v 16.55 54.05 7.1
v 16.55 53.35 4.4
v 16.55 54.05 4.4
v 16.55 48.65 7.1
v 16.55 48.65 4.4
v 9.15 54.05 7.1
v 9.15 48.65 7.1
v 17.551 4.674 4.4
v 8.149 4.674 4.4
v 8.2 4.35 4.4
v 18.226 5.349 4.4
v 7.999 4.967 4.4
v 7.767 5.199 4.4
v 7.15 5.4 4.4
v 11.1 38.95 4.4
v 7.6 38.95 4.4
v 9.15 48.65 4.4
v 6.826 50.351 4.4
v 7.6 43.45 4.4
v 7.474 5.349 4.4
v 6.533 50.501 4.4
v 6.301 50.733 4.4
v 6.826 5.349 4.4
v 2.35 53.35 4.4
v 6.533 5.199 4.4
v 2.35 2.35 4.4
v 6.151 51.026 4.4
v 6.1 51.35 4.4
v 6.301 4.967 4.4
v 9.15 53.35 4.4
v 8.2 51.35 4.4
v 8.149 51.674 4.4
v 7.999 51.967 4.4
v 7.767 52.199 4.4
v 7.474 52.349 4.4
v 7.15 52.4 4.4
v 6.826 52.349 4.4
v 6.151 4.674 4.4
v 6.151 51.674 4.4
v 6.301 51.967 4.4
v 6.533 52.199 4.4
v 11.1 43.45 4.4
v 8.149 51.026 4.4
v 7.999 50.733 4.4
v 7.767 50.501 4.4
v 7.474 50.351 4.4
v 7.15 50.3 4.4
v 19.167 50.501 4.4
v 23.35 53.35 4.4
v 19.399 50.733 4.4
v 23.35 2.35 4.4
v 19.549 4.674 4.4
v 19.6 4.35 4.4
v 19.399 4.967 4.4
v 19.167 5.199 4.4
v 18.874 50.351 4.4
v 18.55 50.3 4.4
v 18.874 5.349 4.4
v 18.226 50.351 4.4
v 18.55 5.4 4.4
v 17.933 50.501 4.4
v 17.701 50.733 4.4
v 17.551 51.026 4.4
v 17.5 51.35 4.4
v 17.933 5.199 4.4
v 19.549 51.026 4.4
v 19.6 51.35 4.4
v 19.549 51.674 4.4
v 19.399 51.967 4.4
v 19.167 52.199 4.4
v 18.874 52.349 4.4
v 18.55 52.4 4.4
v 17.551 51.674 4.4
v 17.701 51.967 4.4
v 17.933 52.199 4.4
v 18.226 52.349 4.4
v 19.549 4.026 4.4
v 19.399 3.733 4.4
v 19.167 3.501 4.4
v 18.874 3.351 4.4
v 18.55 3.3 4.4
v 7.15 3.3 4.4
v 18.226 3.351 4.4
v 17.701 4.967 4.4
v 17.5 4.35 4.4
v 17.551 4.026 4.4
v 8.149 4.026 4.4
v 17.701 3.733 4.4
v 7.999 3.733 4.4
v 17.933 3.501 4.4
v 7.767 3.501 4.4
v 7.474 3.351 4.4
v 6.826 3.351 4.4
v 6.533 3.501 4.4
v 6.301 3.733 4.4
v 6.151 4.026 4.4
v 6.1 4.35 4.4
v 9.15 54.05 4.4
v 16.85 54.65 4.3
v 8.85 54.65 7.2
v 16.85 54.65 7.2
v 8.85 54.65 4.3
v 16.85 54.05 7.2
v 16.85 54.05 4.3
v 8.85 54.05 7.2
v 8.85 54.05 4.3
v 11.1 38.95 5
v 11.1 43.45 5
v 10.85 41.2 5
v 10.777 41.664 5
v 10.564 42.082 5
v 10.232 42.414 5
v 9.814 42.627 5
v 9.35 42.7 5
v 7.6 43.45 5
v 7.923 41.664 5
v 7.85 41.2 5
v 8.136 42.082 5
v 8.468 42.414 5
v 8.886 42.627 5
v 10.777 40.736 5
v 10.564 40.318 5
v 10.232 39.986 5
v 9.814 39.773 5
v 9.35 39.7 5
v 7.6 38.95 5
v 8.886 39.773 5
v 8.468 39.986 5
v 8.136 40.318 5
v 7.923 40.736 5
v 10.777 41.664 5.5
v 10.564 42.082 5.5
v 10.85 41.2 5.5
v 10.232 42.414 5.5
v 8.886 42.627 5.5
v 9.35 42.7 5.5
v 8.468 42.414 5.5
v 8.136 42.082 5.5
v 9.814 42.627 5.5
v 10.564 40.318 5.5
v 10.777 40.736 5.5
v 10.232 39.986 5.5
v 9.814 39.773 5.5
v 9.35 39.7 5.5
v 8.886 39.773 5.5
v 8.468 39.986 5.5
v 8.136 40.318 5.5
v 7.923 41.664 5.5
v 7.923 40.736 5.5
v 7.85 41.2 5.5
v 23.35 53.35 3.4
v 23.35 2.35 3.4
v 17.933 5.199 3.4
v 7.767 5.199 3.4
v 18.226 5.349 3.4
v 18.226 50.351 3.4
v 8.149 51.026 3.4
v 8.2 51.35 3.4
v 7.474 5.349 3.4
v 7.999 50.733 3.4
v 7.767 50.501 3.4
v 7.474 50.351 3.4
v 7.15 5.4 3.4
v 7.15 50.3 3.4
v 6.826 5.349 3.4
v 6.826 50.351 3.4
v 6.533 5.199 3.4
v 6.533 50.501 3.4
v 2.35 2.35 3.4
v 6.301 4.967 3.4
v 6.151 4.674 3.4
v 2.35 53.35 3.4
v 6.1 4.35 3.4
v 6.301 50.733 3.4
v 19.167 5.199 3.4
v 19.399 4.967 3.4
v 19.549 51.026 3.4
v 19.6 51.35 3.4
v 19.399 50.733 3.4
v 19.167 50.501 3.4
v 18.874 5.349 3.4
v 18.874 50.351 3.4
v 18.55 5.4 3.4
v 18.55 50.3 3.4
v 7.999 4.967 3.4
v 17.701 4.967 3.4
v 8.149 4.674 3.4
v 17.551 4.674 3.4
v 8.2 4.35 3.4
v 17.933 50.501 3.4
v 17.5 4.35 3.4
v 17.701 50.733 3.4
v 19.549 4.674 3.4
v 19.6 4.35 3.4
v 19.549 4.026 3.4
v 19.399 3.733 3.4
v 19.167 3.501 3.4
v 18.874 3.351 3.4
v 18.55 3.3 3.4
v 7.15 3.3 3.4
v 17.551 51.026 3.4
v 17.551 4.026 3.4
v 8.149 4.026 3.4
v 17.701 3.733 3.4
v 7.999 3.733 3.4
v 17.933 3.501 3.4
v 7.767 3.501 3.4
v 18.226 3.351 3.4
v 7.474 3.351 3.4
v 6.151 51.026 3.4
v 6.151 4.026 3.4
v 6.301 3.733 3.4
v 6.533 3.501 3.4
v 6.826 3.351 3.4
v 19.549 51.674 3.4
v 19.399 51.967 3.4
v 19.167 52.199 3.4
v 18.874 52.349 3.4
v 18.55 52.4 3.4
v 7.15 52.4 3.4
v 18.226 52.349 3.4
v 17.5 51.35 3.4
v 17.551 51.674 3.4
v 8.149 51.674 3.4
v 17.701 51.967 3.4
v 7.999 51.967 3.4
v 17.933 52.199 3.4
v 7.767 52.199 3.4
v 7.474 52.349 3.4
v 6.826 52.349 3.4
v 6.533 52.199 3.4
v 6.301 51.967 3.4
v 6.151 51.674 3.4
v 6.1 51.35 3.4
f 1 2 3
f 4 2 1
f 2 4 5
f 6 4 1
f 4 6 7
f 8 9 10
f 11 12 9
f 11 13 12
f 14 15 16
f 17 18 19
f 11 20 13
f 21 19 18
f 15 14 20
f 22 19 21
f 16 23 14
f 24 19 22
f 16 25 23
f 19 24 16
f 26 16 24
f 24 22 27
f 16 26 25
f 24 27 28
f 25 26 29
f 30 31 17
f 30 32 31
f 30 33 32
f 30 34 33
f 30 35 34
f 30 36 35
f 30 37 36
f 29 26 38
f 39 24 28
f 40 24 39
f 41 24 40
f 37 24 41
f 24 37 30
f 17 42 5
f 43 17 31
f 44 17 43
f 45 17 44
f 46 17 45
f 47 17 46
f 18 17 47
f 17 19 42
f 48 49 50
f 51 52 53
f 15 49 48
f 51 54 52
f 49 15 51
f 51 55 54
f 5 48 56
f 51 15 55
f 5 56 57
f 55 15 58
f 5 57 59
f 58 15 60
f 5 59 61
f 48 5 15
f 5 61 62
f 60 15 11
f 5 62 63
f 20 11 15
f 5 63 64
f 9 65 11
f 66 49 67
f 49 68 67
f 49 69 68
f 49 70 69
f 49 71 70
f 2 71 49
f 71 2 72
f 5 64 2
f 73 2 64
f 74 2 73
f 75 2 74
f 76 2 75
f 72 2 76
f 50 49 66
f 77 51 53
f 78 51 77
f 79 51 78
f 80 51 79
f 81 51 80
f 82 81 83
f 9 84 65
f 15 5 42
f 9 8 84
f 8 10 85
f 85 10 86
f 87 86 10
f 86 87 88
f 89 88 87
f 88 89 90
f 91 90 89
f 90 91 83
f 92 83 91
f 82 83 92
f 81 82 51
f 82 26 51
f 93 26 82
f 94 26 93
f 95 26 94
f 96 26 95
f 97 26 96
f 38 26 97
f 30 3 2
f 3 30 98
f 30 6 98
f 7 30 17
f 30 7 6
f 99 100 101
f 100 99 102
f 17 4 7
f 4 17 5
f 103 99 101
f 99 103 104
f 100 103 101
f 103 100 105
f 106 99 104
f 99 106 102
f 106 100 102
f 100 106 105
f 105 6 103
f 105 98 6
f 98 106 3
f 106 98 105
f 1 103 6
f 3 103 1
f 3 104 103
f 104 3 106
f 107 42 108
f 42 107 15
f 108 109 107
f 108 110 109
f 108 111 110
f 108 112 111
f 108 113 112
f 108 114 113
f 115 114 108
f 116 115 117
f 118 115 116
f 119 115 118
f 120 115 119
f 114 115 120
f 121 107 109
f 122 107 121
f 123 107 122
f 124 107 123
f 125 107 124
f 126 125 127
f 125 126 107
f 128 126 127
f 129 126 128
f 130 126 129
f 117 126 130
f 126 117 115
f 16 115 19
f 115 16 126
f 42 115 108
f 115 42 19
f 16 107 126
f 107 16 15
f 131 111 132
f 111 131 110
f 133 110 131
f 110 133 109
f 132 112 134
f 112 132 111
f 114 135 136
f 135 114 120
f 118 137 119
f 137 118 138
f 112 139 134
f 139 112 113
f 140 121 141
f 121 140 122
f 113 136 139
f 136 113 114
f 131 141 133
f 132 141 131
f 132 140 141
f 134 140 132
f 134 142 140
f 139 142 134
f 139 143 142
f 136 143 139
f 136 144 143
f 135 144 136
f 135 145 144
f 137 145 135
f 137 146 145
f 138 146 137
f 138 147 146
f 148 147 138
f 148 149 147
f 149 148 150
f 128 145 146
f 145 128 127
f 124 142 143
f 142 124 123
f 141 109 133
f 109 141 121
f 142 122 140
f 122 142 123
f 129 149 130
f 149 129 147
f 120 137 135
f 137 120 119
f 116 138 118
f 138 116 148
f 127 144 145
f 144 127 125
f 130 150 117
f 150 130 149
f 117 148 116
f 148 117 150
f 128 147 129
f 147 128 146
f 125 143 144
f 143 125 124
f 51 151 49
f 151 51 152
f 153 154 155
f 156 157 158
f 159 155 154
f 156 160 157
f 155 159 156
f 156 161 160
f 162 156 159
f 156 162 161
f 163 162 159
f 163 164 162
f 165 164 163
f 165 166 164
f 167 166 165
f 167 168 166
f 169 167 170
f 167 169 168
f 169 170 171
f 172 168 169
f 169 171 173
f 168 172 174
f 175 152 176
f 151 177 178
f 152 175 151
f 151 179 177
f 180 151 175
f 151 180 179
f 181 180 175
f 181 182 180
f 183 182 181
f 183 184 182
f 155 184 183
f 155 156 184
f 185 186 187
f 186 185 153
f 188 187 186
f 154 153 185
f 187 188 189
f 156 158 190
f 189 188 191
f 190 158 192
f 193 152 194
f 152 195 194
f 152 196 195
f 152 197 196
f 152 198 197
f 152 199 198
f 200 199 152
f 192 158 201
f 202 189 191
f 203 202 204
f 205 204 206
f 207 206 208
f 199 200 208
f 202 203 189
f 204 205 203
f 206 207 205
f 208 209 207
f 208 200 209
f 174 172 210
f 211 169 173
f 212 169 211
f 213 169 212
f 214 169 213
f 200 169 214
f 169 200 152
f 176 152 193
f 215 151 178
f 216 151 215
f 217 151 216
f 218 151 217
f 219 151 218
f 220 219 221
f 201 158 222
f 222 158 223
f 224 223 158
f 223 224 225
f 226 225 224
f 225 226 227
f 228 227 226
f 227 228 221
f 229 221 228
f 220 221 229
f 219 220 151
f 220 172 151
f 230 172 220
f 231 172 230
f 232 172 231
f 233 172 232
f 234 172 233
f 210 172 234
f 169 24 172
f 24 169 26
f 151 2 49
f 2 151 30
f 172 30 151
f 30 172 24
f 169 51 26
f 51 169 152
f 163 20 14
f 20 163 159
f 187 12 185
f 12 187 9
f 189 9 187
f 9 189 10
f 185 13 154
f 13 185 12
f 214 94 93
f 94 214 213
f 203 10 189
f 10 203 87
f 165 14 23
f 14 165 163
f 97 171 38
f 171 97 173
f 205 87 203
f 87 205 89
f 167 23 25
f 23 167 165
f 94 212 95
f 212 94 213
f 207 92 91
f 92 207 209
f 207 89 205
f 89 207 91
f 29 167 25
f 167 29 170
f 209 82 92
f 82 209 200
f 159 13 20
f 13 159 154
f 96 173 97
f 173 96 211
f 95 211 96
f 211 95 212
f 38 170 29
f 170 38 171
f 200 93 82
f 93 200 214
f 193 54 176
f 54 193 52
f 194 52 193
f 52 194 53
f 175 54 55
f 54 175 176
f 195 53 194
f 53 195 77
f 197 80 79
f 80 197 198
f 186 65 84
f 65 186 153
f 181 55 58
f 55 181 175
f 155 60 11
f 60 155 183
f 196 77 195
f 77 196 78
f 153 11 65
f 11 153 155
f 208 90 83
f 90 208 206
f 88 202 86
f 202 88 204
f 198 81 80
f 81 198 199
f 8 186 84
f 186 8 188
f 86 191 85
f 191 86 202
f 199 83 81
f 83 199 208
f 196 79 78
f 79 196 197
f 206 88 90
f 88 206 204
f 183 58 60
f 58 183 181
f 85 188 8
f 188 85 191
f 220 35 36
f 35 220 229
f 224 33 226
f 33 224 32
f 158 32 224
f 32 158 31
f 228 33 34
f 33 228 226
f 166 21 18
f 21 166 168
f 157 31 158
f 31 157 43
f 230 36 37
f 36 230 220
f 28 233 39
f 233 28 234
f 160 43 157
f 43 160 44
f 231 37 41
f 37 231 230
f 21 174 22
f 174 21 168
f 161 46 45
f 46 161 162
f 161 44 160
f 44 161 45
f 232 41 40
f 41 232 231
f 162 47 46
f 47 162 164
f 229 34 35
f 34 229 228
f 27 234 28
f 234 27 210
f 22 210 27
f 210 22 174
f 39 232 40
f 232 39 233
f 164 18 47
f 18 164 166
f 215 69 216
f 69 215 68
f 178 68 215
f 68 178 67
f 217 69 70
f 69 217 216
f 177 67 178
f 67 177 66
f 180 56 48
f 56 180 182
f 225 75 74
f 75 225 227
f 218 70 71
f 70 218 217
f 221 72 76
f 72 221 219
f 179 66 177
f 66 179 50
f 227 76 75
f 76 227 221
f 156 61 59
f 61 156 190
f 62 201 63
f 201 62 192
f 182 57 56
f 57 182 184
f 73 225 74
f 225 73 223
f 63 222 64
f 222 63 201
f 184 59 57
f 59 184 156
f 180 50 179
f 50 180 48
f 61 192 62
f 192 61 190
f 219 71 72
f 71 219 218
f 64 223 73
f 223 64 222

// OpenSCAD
resolution = 20; //[10, 20, 30, 50, 100]
$fn = resolution;

show_frame = false; // [true, false]
show_pico = true; // [true, false]
show_lid = false; // [true, false]
show_button = false; // [true, false]

module rounded_plate(w, h, t, d) {
    translate([0, (d/2), 0])
    cube([w, (h-d), t]);
    translate([(d/2), 0, 0])
    cube([(w-d), h, t]);
    translate([(d/2), (d/2), 0])
    cylinder(h=t, d=d);
    translate([w-(d/2), (d/2), 0])
    cylinder(h=t, d=d);
    translate([(d/2), h-(d/2), 0])
    cylinder(h=t, d=d);
    translate([w-(d/2), h-(d/2), 0])
    cylinder(h=t, d=d);
}

module usb_port() {
    translate([0.3, 0, 0])
    color("grey")
    difference() {
        union() {
            cube([7.4, 6, 2.7]);
            translate([-0.3, 5.4, -0.1])
            cube([8, 0.6, 2.9]);
        }
    }
}

module switch() {
    color("grey")
    cube([3.5, 4.5, 1]);
    color("white")
    translate([(3.5/2), (4.5/2), 0])
    cylinder(h=1.5, d=3);
}

p_w = 21;
p_h = 51;
p_t = 1.0;
os = 0.35;
b = 2;

module pico() {
    translate([((p_w-8)/2), ((p_h+1.3)-6), p_t])
    usb_port();

    translate([5.25, 36.6, 0.6])
    switch();

    difference() {
        color("green")
        cube([p_w, p_h, 1]);

        translate([((p_w/2)-5.7), 2, -0.01])
        cylinder(h=p_t+0.02, d=2.1);
       
        translate([(p_w-((p_w/2)-5.7)), 2, -0.01])
        cylinder(h=p_t+0.02, d=2.1);

        translate([((p_w/2)-5.7), (p_h-2), -0.01])
        cylinder(h=p_t+0.02, d=2.1);

        translate([(p_w-((p_w/2)-5.7)), (p_h-2), -0.01])
        cylinder(h=p_t+0.02, d=2.1);
    }
}

if (show_pico) {
    translate([(os+b), (os+b), 3.4])
    pico();
}

if (show_frame) {
    union() {
        difference() {
            // Outer frame
            rounded_plate(p_w+(2*(os+b)), p_h+(2*(os+b)), 10, (2*(os+b)));
            
            // Board cut-out
            translate([b, b, -1])
            cube([p_w+(2*os), p_h+(2*os), 12]);
            
            // USB port cut-out
//            translate([b+os+((p_w-10)/2), b+os+((p_h+1)-6), 3.4])
//            cube([10, 8, 4.7]);
            translate([b+os+((p_w-10)/2), b+(2*os)+p_h-1, 8.1])
            rotate([-90, 0, 0])
            rounded_plate(10, 4.7, 4.7, 2);
            
            // Lid release cut-out
            difference() {
                union() {
                    translate([b+os+((p_w-10)/2), -1, 10-1])
                    cube([10, 8, 2]);
                    translate([b+os+((p_w-6)/2), -1, 10-1])
                    rotate([-90, 0, 0])
                    cylinder(h=4, d=2); 
                    translate([b+os+((p_w-6)/2), -1, 10-2])
                    cube([6, 8, 3]);
                    translate([b+os+((p_w+6)/2), -1, 10-1])
                    rotate([-90, 0, 0])
                    cylinder(h=4, d=2); 
                }
                translate([b+os+((p_w+10)/2), -1, 10-1])
                rotate([-90, 0, 0])
                cylinder(h=4, d=2); 
                translate([b+os+((p_w-10)/2), -1, 10-1])
                rotate([-90, 0, 0])
                cylinder(h=4, d=2); 
            }
            
            // Outer frame
            translate([1, 1, 10-1.2])
            rounded_plate(p_w+(2*(os+b))-2, p_h+(2*(os+b))-2, 2, (2*(os+b))-2);

            // Left top retainer cut-out
            translate([b+os+(p_w/2)-(3.2/2)-7.1, b+p_h+(2*os), 10-3+0.2])
            cube([3.2, 0.7, 1.0]);

            // Right top retainer cut-out
            translate([b+os+(p_w/2)-(3.2/2)+7.1, b+p_h+(2*os), 10-3+0.2])
            cube([3.2, 0.7, 1.0]);

            // Left bottom retainer cut-out
            translate([b+os+(p_w/2)-(4/2)-7.1, b+os-0.7, 10-3+0.2])
            cube([4, 0.7, 1.0]);

            // Right bottom retainer cut-out
            translate([b+os+(p_w/2)-(4/2)+7.1, b+os-0.7, 10-3+0.2])
            cube([4, 0.7, 1.0]);

            // Left retainer cut-out
            translate([b-0.7, b+os+(p_h/2)-2, 10-3+0.2])
            cube([0.7, 4, 1.0]);

            // Right retainer cut-out
            translate([b+(2*os)+p_w, b+os+(p_h/2)-2, 10-3+0.2])
            cube([0.7, 4, 1.0]);
        }
        
        // Left support rail
        translate([b+os+(p_w/2)-(3/2)-5.5, 0, 0])
        cube([3, p_h+(2*(os+b)), 3.4]);
       
        // Right support rail
        translate([b+os+(p_w/2)-(3/2)+5.5, 0, 0])
        cube([3, p_h+(2*(os+b)), 3.4]);

        // Left top retainer
        translate([b+os+(p_w/2)-(2.2/2)-6.1, b+p_h+(2*os)-0.6, 3.4+1+0.5])
        cube([2.2, 0.6, 0.8]);

        // Right top retainer
        translate([b+os+(p_w/2)-(2.2/2)+6.1, b+p_h+(2*os)-0.6, 3.4+1+0.5])
        cube([2.2, 0.6, 0.8]);

        // Left bottom retainer
        translate([b+os+(p_w/2)-(3/2)-5.7, b, 3.4+1+0.])
        cube([3, 0.6, 0.8]);

        // Right bottom retainer
        translate([b+os+(p_w/2)-(3/2)+5.7, b, 3.4+1+0.5])
        cube([3, 0.6, 0.8]);
    }
}

if (show_lid) {
    difference() {
        union() {
            translate([1+os, 1+os, 10-1.2])
            rounded_plate(p_w+(2*b)-2, p_h+(2*b)-2, 1, (2*b)-2);
            translate([(os+b), (os+b), 10-3])
            rounded_plate(p_w, p_h, 2, (2*b)-3);
            
            // Left top retainer
            translate([b+os+(p_w/2)-(2.2/2)-7.1, b+p_h+os, 10-3+0.4])
            cube([2.2, 0.6, 0.6]);

            // Right top retainer
            translate([b+os+(p_w/2)-(2.2/2)+7.1, b+p_h+os, 10-3+0.4])
            cube([2.2, 0.6, 0.6]);

            // Left bottom retainer
            translate([b+os+(p_w/2)-(3/2)-7.1, b+os-0.5, 10-3+0.3])
            cube([3, 0.6, 0.6]);

            // Right bottom retainer
            translate([b+os+(p_w/2)-(3/2)+7.1, b+os-0.5, 10-3+0.3])
            cube([3, 0.6, 0.6]);

            // Left retainer
            translate([b+os-0.6, b+os+(p_h/2)-1.5, 10-3+0.3])
            cube([0.6, 3, 0.6]);            

            // Right retainer
            translate([b+os+p_w, b+os+(p_h/2)-1.5, 10-3+0.3])
            cube([0.6, 3, 0.6]);            
        }

        // USB port cut-out
        translate([b+os+((p_w-10)/2), b+p_h+(2*os)-2, 10-4.2])
        cube([10, 8, 2.4]);

        // Lid release cut-out
        translate([b+os+((p_w-10)/2), -1, 10-4.2])
        cube([10, 8, 3]);
        
        // Switch cut-out
        translate([(os+b)+7, (os+b)+38.85, 0])
        cylinder(h=10, d=5);
        
        // Inset
        translate([(os+b)+1, (os+b)+1, 10-4])
        cube([p_w-2, p_h-2, 3]);
    }
    // Switch surround
    translate([(os+b), (os+b)+38.85-6, 10-2])
    cube([p_w, 1, 1]);    

    translate([(os+b), (os+b)+38.85+5, 10-2])
    cube([p_w, 1, 1]);    

}


if (show_button) {
    color("red")
    union() {
        translate([(os+b)+7, (os+b)+38.85, 7.5])
        cylinder(h=2.3, d=4.4);
        difference() {
            translate([(os+b)+7, (os+b)+38.85, 6.5])
            cylinder(h=2, d=7.6);
            translate([(os+b)+7, (os+b)+38.85, 6.5])
            cylinder(h=1, d=6.6);
        }
    }
}
